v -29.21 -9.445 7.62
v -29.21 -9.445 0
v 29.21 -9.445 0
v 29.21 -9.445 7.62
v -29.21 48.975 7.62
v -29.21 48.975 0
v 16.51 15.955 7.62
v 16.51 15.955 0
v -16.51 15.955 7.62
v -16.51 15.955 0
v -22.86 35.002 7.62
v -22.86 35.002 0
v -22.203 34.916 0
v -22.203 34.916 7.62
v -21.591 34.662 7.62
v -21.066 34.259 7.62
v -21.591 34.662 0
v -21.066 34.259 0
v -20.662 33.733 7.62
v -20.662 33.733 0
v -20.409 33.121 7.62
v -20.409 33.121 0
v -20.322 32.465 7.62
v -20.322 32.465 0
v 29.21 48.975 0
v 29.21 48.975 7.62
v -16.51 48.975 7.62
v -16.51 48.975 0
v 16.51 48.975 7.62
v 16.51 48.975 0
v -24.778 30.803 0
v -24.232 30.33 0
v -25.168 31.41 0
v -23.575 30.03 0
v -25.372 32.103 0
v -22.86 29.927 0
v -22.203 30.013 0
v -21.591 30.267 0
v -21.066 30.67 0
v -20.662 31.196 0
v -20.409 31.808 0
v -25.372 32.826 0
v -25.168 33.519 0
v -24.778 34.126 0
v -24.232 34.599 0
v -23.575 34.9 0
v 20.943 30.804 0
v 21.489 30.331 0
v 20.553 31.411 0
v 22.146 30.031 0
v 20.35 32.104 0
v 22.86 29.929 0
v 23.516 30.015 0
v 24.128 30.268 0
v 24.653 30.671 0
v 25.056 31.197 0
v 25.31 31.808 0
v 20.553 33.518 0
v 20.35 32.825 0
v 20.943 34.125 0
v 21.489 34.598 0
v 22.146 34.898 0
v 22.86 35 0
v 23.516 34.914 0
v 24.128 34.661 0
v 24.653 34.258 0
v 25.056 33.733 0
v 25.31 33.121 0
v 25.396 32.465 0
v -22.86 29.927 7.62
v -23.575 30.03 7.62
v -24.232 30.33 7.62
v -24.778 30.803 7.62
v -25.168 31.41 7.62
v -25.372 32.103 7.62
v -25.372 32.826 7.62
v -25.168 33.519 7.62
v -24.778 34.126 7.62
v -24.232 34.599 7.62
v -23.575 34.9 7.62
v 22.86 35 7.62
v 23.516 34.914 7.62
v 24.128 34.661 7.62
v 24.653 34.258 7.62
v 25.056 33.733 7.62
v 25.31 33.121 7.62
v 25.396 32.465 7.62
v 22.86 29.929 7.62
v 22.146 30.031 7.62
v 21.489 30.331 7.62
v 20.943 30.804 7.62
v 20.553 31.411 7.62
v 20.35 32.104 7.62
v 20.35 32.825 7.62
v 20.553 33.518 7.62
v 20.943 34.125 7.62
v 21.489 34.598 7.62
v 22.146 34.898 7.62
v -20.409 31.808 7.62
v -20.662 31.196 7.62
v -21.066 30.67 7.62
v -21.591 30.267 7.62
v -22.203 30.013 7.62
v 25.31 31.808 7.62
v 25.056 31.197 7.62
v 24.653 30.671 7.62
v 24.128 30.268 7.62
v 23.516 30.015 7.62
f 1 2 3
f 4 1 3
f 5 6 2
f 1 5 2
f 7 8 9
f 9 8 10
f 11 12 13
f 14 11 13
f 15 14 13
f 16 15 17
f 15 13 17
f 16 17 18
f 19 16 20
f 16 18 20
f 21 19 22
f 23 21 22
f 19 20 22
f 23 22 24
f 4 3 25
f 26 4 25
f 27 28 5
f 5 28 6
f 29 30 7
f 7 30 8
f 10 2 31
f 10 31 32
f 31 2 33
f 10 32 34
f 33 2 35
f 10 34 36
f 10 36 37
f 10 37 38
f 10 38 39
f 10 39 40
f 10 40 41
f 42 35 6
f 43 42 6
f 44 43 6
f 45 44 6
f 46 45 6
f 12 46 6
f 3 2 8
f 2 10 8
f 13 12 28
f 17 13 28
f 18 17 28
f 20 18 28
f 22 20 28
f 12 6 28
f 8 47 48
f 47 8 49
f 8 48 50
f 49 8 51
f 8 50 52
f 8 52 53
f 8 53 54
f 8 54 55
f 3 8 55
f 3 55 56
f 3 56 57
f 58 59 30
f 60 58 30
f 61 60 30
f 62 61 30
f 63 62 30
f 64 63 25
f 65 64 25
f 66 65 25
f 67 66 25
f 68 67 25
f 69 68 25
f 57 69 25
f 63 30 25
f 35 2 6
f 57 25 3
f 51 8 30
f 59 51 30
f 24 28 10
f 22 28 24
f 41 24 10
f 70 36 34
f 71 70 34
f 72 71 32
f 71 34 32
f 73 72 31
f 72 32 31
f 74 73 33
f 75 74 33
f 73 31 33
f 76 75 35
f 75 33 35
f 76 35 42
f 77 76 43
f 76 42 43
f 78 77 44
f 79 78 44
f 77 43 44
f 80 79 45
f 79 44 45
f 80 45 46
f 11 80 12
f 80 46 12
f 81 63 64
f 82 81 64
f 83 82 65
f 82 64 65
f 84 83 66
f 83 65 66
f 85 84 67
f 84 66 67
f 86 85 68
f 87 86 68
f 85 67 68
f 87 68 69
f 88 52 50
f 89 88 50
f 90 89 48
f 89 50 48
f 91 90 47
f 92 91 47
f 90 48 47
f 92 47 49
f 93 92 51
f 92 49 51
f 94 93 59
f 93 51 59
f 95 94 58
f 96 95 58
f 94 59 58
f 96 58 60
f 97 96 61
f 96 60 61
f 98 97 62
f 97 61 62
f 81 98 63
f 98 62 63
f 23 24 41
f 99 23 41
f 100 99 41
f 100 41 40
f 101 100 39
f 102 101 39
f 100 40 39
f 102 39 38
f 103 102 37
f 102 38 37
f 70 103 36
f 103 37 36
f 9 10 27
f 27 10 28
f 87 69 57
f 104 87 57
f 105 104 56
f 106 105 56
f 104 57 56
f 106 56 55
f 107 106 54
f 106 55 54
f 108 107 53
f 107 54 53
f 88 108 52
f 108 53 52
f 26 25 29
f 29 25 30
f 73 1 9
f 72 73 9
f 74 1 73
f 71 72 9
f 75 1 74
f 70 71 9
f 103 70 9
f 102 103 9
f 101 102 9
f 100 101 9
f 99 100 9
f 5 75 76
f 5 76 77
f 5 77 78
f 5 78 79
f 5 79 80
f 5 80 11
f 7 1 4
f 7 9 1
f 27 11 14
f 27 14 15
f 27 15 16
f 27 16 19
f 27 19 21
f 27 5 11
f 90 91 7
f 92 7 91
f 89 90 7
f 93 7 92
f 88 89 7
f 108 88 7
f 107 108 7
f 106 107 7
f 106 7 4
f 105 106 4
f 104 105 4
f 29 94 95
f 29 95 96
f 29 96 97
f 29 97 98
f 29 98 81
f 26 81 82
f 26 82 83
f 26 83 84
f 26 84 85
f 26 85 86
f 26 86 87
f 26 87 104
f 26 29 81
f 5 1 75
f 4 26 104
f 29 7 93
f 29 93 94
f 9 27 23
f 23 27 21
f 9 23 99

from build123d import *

# Parameters (mm, degrees)
F1_DEPTH = 7.62


with BuildPart() as f1:
    # F0 (on Top) → F1 (new body)
    with BuildSketch(Plane.XY):
        with BuildLine():
            Line((-29.210002, 48.974563), (-29.210002, 15.954563))
            Line((-29.210002, 15.954563), (-22.860002, 15.954563))
            Line((-22.860002, 15.954563), (-22.860002, 29.926767))
            ThreePointArc((-22.860002, 29.926767), (-25.397797, 32.464563), (-22.860002, 35.002358))
            Line((-22.860002, 35.002358), (-22.860002, 48.974563))
            Line((-22.860002, 48.974563), (-29.210002, 48.974563))
        make_face()
        Polygon((-22.860002, 15.954563), (-29.210002, 15.954563), (-29.210002, -9.445437), (29.209998, -9.445437), (29.209998, 15.954563), (22.859998, 15.954563), (16.509998, 15.954563), (-16.510002, 15.954563), align=None)
        with BuildLine():
            Line((-22.860002, 29.926767), (-22.860002, 15.954563))
            Line((-22.860002, 15.954563), (-16.510002, 15.954563))
            Line((-16.510002, 15.954563), (-16.510002, 48.974563))
            Line((-16.510002, 48.974563), (-22.860002, 48.974563))
            Line((-22.860002, 48.974563), (-22.860002, 35.002358))
            ThreePointArc((-22.860002, 35.002358), (-21.065509, 34.259055), (-20.322206, 32.464563))
            ThreePointArc((-20.322206, 32.464563), (-21.065509, 30.67007), (-22.860002, 29.926767))
        make_face()
        with BuildLine():
            Line((16.509998, 48.974563), (16.509998, 15.954563))
            Line((16.509998, 15.954563), (22.859998, 15.954563))
            Line((22.859998, 15.954563), (22.859998, 29.928652))
            ThreePointArc((22.859998, 29.928652), (20.324087, 32.464563), (22.859998, 35.000474))
            Line((22.859998, 35.000474), (22.859998, 48.974563))
            Line((22.859998, 48.974563), (16.509998, 48.974563))
        make_face()
        with BuildLine():
            Line((22.859998, 15.954563), (29.209998, 15.954563))
            Line((29.209998, 15.954563), (29.209998, 48.974563))
            Line((29.209998, 48.974563), (22.859998, 48.974563))
            Line((22.859998, 48.974563), (22.859998, 35.000474))
            ThreePointArc((22.859998, 35.000474), (24.653158, 34.257723), (25.395909, 32.464563))
            ThreePointArc((25.395909, 32.464563), (24.653158, 30.671403), (22.859998, 29.928652))
            Line((22.859998, 29.928652), (22.859998, 15.954563))
        make_face()
    extrude(amount=F1_DEPTH)


solid = f1.part
